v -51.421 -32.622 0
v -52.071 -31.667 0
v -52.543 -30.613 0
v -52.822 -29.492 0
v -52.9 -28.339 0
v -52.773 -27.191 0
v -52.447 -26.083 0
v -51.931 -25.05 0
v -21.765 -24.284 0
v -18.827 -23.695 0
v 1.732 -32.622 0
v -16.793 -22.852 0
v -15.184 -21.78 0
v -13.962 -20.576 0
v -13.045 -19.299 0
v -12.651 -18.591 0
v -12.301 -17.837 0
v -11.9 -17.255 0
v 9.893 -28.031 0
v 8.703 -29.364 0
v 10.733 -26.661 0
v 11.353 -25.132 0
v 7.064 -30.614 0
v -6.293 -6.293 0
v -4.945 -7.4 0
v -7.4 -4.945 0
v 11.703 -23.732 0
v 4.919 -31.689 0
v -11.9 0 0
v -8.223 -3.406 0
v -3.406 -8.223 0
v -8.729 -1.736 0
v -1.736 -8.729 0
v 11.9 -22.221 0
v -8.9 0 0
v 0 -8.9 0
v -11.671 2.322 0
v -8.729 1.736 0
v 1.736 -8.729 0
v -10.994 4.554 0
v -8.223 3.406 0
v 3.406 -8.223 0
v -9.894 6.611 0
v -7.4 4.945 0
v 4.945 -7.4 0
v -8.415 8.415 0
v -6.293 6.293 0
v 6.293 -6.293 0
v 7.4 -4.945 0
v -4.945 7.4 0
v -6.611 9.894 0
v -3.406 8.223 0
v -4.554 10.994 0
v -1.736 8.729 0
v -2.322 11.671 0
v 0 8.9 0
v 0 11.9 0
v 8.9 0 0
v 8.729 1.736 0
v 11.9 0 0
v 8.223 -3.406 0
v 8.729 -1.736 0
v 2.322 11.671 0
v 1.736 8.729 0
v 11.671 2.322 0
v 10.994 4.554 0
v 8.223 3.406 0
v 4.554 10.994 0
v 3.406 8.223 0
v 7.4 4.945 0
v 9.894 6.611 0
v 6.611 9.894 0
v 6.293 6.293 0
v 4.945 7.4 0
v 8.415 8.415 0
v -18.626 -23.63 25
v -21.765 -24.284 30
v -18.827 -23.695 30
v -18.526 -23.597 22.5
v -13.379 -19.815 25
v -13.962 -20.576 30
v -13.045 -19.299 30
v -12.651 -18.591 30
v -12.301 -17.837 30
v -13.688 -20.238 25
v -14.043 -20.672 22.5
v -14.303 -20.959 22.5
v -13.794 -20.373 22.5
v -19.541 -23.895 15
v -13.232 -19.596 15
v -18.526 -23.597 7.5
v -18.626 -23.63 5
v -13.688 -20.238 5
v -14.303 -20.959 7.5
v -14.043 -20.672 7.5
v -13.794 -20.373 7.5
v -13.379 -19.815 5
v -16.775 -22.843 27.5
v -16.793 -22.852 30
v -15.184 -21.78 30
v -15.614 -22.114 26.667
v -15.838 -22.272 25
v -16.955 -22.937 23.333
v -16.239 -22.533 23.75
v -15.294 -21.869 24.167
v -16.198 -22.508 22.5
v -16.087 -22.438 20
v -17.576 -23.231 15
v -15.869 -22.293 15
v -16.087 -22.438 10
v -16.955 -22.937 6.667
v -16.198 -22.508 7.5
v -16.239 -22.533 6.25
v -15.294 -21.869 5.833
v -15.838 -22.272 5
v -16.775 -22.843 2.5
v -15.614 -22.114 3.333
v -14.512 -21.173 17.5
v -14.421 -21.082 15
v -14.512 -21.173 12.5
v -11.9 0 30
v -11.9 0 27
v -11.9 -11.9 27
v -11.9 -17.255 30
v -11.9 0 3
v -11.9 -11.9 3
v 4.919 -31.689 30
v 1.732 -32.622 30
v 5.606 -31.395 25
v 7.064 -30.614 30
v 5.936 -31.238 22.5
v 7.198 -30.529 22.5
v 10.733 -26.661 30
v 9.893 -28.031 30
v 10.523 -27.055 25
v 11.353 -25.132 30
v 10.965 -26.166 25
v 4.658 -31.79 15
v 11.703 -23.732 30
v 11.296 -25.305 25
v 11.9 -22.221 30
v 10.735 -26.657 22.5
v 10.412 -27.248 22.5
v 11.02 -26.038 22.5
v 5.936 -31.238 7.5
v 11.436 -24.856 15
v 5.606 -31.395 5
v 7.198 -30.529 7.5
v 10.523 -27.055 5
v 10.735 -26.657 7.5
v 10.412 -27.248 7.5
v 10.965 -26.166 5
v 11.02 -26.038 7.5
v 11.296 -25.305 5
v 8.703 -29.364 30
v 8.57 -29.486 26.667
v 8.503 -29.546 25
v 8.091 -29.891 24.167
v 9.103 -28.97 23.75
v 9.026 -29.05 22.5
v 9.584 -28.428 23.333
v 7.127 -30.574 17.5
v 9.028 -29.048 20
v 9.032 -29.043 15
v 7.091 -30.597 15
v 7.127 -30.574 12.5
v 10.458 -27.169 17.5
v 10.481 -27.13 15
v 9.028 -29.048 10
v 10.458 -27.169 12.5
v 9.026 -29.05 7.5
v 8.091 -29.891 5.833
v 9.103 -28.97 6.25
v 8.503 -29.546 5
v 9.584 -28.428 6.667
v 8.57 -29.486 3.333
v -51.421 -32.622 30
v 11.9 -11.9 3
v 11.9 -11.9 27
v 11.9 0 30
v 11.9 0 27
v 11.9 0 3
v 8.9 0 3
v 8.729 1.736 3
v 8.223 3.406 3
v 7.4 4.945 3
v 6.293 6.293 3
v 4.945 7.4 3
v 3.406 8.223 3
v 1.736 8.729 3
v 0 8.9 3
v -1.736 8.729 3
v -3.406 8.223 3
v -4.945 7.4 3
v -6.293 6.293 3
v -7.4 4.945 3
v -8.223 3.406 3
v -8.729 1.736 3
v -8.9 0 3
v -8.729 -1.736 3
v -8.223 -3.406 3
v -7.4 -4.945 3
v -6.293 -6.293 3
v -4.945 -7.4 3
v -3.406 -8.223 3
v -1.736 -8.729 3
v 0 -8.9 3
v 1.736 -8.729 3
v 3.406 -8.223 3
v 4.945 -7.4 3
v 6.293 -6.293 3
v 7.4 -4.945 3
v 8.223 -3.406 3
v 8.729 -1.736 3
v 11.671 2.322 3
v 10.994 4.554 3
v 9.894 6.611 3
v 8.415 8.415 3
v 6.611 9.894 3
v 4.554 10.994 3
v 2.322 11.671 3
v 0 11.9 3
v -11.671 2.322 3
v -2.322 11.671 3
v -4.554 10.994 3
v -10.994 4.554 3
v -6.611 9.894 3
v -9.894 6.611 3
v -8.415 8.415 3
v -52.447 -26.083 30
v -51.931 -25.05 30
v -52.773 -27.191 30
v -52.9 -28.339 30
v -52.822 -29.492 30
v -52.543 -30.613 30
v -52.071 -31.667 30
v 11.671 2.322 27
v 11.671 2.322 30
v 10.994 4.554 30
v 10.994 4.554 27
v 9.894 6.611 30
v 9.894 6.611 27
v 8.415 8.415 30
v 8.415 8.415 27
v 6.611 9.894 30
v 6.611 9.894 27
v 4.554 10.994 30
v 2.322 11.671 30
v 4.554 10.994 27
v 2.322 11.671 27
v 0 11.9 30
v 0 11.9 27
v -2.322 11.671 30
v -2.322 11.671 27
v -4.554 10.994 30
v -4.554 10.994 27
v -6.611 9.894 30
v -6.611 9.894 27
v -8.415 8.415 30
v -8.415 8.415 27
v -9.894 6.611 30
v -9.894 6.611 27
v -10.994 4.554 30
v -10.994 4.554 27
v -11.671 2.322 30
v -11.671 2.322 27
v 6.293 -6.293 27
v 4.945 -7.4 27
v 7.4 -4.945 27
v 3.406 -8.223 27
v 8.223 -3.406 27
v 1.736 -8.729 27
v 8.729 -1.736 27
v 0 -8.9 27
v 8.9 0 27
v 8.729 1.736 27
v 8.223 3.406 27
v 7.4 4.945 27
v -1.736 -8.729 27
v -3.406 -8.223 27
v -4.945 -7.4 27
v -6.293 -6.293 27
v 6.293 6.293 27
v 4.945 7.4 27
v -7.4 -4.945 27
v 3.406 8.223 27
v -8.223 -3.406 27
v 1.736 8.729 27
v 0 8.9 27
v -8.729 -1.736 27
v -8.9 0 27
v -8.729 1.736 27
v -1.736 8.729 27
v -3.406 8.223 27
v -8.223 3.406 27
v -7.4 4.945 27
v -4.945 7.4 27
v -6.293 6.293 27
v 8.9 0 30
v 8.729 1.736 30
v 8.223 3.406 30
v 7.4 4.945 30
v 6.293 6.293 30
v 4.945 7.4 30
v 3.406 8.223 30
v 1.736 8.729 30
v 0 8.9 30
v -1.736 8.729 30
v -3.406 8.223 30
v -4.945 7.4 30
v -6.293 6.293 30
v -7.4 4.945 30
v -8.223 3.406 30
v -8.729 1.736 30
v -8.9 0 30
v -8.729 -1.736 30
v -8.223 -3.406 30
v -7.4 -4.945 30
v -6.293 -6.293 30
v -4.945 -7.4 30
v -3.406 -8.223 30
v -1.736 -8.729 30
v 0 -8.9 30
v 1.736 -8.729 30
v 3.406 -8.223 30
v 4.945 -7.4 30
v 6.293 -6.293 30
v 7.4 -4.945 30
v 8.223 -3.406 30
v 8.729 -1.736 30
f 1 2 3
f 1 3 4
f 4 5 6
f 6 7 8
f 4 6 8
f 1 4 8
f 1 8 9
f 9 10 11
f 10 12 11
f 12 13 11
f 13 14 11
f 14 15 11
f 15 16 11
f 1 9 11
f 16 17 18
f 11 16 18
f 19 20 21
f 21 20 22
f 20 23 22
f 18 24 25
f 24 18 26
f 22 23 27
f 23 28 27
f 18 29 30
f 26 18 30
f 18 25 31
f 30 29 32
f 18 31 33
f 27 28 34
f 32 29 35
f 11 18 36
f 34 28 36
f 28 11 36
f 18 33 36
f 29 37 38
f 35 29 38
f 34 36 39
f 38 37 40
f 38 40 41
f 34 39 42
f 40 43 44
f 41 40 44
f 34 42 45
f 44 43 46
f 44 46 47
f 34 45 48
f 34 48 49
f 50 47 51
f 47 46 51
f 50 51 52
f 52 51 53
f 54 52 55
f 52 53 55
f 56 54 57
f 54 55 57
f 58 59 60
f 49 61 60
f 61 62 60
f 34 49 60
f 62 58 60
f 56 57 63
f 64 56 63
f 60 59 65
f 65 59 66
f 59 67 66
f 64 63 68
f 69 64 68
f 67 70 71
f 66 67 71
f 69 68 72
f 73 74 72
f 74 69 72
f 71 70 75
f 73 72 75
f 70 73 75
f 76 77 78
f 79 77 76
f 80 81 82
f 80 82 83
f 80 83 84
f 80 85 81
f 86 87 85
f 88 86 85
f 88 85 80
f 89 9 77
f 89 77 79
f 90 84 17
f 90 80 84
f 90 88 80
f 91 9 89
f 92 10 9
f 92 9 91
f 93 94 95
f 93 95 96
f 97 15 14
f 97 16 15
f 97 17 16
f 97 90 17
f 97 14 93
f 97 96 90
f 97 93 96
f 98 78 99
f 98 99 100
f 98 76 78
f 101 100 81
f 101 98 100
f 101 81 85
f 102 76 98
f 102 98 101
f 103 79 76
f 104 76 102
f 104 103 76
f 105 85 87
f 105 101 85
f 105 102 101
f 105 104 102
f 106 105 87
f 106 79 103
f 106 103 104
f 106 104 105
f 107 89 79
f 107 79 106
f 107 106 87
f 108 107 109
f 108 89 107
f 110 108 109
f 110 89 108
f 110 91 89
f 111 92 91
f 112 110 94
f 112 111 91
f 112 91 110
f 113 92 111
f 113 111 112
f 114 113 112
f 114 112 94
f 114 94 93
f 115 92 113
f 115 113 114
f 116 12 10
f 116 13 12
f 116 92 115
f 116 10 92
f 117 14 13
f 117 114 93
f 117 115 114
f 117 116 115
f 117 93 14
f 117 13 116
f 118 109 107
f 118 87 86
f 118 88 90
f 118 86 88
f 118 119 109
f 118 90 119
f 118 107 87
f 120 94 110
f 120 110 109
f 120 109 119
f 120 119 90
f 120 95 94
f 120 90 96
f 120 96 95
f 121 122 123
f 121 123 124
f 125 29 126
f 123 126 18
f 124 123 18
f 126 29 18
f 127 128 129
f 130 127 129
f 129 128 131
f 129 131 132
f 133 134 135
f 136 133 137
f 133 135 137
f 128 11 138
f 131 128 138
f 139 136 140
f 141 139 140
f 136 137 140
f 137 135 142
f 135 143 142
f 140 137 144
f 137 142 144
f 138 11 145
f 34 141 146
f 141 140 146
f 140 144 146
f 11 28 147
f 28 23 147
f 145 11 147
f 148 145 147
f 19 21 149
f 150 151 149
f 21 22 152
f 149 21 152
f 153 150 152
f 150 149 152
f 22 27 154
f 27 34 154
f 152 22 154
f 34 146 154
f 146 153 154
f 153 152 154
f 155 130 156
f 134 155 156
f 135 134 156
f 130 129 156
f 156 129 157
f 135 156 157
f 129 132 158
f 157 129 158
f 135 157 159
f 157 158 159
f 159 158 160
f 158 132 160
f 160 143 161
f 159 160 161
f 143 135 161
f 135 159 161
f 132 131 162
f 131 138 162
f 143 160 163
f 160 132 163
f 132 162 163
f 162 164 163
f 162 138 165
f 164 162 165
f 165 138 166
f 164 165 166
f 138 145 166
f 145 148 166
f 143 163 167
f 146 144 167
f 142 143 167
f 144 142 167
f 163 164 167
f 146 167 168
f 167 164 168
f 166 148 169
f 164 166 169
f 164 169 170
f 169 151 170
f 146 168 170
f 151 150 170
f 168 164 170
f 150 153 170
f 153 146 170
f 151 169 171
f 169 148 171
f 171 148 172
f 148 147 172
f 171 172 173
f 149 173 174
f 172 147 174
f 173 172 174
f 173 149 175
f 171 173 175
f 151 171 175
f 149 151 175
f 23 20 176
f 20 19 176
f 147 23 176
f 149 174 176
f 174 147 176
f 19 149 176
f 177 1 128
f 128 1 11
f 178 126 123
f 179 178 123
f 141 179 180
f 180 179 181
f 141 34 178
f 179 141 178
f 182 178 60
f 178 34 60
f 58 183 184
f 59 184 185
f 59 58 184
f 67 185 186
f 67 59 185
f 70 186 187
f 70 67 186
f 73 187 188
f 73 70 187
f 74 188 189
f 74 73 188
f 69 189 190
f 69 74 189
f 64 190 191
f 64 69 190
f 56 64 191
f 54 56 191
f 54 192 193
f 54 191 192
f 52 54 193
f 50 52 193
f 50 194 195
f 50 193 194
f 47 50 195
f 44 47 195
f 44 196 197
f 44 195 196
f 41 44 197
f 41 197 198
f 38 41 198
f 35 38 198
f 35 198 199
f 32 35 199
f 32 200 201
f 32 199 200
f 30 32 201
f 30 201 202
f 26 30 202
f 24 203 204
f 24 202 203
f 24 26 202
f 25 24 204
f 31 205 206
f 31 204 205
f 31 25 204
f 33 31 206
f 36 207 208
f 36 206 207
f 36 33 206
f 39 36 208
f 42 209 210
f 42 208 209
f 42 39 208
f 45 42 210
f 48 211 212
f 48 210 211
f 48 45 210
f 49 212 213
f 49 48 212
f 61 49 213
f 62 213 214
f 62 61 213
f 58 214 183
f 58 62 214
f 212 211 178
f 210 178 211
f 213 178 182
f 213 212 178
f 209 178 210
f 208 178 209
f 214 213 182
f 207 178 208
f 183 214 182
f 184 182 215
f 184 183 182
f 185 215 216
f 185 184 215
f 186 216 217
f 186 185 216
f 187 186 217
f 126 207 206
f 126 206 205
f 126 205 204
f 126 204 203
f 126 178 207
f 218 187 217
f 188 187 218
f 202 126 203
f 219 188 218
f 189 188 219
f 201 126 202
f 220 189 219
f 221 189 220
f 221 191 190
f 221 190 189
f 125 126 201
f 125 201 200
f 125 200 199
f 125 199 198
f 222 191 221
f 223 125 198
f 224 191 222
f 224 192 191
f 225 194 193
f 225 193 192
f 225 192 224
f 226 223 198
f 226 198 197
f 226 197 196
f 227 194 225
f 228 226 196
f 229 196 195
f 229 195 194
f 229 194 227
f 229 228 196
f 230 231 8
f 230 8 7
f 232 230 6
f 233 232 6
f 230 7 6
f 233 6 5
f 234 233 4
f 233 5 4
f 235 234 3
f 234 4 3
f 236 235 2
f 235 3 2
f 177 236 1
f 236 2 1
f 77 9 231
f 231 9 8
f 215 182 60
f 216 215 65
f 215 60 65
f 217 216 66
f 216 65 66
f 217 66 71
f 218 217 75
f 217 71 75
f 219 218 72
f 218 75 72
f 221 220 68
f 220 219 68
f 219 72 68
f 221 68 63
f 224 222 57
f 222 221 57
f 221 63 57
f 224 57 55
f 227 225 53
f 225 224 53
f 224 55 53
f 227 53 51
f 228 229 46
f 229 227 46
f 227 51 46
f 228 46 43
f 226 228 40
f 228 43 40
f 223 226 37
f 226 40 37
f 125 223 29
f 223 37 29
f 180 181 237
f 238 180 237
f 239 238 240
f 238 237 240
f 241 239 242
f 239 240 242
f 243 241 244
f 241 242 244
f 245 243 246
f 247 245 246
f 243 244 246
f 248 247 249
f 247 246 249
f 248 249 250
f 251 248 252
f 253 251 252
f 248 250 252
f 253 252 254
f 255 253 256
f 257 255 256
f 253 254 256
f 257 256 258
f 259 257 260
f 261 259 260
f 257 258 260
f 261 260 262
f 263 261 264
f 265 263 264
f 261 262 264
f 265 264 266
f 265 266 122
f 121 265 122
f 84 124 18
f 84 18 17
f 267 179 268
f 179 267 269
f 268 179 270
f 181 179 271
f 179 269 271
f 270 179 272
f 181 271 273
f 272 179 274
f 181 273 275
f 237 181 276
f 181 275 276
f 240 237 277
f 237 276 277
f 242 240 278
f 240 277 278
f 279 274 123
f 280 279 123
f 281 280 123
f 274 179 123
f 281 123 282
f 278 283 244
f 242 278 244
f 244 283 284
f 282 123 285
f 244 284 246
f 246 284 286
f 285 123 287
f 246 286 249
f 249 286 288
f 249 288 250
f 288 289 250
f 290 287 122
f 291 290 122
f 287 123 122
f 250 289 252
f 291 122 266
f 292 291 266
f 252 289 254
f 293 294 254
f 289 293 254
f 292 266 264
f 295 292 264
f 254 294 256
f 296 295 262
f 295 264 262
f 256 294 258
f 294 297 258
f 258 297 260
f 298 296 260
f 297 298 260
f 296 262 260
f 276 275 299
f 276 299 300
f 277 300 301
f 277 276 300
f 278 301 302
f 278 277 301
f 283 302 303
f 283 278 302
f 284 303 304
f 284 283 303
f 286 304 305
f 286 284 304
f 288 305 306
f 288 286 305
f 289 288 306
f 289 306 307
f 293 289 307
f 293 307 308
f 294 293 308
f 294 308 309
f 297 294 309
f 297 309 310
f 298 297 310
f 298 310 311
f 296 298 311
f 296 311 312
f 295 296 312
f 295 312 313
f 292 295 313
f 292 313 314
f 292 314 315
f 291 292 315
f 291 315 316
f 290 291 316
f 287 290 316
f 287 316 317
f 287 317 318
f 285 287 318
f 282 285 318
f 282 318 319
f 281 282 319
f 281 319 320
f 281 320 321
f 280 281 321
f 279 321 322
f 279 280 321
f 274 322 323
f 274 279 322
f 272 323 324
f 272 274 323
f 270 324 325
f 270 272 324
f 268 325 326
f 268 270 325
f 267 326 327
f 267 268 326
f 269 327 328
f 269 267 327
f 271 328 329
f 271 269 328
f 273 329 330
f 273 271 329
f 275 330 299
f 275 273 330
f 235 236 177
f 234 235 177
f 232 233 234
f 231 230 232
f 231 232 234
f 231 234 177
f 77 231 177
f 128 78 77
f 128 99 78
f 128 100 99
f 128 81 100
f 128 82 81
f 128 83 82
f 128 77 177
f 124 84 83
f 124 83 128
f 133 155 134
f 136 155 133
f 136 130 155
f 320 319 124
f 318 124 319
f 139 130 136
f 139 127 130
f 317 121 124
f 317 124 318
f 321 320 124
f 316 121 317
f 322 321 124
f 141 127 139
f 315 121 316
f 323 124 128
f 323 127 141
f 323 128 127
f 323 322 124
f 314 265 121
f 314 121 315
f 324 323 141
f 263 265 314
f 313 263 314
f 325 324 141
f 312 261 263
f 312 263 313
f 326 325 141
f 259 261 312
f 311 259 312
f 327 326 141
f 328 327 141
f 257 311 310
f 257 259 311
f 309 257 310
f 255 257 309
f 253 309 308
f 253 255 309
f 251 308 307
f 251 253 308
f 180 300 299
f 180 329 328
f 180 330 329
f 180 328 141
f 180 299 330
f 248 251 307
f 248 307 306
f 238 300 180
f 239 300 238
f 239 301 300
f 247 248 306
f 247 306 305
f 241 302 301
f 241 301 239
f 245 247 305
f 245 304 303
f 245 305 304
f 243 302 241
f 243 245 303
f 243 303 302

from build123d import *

# Parameters (mm, degrees)
SKETCH1_R           = 8.9
BOSS_EXTRUDE1_DEPTH = 30
SKETCH2_W           = 24
SKETCH2_H           = 23.8
CUT_EXTRUDE1_DEPTH  = 23.8


with BuildPart() as part:
    # Sketch1 → Boss-Extrude1 (new body)
    with BuildSketch(Plane.XY):
        with BuildLine():
            ThreePointArc((11.9, 0), (0, 11.9), (-11.9, 0))
            Line((-11.9, 0), (-11.9, -16.75270202))
            Line((-11.9, -16.75270202), (-11.9, -17.254561811))
            Line((-11.9, -17.254561811), (-12.301407367, -17.836587713))
            add(Edge.make_bspline(
                [(-21.764559413, -24.28445135), (-14.705345203, -23.52602921), (-12.301407367, -17.836587713)],
                knots=[0, 0, 0, 0.916072404, 0.916072404, 0.916072404], degree=2))
            Line((-21.764559413, -24.28445135), (-51.930587301, -25.04963318))
            ThreePointArc((-51.930587301, -25.04963318), (-52.886196001, -28.917406192), (-51.420694634, -32.62215474))
            Line((-51.420694634, -32.62215474), (1.732240064, -32.62215474))
            add(Edge.make_bspline(
                [(1.732240064, -32.62215474), (11.248165951, -30.665230595), (11.9, -22.221272353)],
                knots=[0, 0, 0, 1, 1, 1], degree=2))
            Line((11.9, -22.221272353), (11.9, 0))
        make_face()
        Circle(SKETCH1_R, mode=Mode.SUBTRACT)
    extrude(amount=BOSS_EXTRUDE1_DEPTH)

    # Sketch2 → Cut-Extrude1 (cut)
    with BuildSketch(Plane.ZY.offset(11.9)):
        with Locations((15, 0)):
            Rectangle(SKETCH2_W, SKETCH2_H)
    extrude(amount=-CUT_EXTRUDE1_DEPTH, mode=Mode.SUBTRACT)


solid = part.part
